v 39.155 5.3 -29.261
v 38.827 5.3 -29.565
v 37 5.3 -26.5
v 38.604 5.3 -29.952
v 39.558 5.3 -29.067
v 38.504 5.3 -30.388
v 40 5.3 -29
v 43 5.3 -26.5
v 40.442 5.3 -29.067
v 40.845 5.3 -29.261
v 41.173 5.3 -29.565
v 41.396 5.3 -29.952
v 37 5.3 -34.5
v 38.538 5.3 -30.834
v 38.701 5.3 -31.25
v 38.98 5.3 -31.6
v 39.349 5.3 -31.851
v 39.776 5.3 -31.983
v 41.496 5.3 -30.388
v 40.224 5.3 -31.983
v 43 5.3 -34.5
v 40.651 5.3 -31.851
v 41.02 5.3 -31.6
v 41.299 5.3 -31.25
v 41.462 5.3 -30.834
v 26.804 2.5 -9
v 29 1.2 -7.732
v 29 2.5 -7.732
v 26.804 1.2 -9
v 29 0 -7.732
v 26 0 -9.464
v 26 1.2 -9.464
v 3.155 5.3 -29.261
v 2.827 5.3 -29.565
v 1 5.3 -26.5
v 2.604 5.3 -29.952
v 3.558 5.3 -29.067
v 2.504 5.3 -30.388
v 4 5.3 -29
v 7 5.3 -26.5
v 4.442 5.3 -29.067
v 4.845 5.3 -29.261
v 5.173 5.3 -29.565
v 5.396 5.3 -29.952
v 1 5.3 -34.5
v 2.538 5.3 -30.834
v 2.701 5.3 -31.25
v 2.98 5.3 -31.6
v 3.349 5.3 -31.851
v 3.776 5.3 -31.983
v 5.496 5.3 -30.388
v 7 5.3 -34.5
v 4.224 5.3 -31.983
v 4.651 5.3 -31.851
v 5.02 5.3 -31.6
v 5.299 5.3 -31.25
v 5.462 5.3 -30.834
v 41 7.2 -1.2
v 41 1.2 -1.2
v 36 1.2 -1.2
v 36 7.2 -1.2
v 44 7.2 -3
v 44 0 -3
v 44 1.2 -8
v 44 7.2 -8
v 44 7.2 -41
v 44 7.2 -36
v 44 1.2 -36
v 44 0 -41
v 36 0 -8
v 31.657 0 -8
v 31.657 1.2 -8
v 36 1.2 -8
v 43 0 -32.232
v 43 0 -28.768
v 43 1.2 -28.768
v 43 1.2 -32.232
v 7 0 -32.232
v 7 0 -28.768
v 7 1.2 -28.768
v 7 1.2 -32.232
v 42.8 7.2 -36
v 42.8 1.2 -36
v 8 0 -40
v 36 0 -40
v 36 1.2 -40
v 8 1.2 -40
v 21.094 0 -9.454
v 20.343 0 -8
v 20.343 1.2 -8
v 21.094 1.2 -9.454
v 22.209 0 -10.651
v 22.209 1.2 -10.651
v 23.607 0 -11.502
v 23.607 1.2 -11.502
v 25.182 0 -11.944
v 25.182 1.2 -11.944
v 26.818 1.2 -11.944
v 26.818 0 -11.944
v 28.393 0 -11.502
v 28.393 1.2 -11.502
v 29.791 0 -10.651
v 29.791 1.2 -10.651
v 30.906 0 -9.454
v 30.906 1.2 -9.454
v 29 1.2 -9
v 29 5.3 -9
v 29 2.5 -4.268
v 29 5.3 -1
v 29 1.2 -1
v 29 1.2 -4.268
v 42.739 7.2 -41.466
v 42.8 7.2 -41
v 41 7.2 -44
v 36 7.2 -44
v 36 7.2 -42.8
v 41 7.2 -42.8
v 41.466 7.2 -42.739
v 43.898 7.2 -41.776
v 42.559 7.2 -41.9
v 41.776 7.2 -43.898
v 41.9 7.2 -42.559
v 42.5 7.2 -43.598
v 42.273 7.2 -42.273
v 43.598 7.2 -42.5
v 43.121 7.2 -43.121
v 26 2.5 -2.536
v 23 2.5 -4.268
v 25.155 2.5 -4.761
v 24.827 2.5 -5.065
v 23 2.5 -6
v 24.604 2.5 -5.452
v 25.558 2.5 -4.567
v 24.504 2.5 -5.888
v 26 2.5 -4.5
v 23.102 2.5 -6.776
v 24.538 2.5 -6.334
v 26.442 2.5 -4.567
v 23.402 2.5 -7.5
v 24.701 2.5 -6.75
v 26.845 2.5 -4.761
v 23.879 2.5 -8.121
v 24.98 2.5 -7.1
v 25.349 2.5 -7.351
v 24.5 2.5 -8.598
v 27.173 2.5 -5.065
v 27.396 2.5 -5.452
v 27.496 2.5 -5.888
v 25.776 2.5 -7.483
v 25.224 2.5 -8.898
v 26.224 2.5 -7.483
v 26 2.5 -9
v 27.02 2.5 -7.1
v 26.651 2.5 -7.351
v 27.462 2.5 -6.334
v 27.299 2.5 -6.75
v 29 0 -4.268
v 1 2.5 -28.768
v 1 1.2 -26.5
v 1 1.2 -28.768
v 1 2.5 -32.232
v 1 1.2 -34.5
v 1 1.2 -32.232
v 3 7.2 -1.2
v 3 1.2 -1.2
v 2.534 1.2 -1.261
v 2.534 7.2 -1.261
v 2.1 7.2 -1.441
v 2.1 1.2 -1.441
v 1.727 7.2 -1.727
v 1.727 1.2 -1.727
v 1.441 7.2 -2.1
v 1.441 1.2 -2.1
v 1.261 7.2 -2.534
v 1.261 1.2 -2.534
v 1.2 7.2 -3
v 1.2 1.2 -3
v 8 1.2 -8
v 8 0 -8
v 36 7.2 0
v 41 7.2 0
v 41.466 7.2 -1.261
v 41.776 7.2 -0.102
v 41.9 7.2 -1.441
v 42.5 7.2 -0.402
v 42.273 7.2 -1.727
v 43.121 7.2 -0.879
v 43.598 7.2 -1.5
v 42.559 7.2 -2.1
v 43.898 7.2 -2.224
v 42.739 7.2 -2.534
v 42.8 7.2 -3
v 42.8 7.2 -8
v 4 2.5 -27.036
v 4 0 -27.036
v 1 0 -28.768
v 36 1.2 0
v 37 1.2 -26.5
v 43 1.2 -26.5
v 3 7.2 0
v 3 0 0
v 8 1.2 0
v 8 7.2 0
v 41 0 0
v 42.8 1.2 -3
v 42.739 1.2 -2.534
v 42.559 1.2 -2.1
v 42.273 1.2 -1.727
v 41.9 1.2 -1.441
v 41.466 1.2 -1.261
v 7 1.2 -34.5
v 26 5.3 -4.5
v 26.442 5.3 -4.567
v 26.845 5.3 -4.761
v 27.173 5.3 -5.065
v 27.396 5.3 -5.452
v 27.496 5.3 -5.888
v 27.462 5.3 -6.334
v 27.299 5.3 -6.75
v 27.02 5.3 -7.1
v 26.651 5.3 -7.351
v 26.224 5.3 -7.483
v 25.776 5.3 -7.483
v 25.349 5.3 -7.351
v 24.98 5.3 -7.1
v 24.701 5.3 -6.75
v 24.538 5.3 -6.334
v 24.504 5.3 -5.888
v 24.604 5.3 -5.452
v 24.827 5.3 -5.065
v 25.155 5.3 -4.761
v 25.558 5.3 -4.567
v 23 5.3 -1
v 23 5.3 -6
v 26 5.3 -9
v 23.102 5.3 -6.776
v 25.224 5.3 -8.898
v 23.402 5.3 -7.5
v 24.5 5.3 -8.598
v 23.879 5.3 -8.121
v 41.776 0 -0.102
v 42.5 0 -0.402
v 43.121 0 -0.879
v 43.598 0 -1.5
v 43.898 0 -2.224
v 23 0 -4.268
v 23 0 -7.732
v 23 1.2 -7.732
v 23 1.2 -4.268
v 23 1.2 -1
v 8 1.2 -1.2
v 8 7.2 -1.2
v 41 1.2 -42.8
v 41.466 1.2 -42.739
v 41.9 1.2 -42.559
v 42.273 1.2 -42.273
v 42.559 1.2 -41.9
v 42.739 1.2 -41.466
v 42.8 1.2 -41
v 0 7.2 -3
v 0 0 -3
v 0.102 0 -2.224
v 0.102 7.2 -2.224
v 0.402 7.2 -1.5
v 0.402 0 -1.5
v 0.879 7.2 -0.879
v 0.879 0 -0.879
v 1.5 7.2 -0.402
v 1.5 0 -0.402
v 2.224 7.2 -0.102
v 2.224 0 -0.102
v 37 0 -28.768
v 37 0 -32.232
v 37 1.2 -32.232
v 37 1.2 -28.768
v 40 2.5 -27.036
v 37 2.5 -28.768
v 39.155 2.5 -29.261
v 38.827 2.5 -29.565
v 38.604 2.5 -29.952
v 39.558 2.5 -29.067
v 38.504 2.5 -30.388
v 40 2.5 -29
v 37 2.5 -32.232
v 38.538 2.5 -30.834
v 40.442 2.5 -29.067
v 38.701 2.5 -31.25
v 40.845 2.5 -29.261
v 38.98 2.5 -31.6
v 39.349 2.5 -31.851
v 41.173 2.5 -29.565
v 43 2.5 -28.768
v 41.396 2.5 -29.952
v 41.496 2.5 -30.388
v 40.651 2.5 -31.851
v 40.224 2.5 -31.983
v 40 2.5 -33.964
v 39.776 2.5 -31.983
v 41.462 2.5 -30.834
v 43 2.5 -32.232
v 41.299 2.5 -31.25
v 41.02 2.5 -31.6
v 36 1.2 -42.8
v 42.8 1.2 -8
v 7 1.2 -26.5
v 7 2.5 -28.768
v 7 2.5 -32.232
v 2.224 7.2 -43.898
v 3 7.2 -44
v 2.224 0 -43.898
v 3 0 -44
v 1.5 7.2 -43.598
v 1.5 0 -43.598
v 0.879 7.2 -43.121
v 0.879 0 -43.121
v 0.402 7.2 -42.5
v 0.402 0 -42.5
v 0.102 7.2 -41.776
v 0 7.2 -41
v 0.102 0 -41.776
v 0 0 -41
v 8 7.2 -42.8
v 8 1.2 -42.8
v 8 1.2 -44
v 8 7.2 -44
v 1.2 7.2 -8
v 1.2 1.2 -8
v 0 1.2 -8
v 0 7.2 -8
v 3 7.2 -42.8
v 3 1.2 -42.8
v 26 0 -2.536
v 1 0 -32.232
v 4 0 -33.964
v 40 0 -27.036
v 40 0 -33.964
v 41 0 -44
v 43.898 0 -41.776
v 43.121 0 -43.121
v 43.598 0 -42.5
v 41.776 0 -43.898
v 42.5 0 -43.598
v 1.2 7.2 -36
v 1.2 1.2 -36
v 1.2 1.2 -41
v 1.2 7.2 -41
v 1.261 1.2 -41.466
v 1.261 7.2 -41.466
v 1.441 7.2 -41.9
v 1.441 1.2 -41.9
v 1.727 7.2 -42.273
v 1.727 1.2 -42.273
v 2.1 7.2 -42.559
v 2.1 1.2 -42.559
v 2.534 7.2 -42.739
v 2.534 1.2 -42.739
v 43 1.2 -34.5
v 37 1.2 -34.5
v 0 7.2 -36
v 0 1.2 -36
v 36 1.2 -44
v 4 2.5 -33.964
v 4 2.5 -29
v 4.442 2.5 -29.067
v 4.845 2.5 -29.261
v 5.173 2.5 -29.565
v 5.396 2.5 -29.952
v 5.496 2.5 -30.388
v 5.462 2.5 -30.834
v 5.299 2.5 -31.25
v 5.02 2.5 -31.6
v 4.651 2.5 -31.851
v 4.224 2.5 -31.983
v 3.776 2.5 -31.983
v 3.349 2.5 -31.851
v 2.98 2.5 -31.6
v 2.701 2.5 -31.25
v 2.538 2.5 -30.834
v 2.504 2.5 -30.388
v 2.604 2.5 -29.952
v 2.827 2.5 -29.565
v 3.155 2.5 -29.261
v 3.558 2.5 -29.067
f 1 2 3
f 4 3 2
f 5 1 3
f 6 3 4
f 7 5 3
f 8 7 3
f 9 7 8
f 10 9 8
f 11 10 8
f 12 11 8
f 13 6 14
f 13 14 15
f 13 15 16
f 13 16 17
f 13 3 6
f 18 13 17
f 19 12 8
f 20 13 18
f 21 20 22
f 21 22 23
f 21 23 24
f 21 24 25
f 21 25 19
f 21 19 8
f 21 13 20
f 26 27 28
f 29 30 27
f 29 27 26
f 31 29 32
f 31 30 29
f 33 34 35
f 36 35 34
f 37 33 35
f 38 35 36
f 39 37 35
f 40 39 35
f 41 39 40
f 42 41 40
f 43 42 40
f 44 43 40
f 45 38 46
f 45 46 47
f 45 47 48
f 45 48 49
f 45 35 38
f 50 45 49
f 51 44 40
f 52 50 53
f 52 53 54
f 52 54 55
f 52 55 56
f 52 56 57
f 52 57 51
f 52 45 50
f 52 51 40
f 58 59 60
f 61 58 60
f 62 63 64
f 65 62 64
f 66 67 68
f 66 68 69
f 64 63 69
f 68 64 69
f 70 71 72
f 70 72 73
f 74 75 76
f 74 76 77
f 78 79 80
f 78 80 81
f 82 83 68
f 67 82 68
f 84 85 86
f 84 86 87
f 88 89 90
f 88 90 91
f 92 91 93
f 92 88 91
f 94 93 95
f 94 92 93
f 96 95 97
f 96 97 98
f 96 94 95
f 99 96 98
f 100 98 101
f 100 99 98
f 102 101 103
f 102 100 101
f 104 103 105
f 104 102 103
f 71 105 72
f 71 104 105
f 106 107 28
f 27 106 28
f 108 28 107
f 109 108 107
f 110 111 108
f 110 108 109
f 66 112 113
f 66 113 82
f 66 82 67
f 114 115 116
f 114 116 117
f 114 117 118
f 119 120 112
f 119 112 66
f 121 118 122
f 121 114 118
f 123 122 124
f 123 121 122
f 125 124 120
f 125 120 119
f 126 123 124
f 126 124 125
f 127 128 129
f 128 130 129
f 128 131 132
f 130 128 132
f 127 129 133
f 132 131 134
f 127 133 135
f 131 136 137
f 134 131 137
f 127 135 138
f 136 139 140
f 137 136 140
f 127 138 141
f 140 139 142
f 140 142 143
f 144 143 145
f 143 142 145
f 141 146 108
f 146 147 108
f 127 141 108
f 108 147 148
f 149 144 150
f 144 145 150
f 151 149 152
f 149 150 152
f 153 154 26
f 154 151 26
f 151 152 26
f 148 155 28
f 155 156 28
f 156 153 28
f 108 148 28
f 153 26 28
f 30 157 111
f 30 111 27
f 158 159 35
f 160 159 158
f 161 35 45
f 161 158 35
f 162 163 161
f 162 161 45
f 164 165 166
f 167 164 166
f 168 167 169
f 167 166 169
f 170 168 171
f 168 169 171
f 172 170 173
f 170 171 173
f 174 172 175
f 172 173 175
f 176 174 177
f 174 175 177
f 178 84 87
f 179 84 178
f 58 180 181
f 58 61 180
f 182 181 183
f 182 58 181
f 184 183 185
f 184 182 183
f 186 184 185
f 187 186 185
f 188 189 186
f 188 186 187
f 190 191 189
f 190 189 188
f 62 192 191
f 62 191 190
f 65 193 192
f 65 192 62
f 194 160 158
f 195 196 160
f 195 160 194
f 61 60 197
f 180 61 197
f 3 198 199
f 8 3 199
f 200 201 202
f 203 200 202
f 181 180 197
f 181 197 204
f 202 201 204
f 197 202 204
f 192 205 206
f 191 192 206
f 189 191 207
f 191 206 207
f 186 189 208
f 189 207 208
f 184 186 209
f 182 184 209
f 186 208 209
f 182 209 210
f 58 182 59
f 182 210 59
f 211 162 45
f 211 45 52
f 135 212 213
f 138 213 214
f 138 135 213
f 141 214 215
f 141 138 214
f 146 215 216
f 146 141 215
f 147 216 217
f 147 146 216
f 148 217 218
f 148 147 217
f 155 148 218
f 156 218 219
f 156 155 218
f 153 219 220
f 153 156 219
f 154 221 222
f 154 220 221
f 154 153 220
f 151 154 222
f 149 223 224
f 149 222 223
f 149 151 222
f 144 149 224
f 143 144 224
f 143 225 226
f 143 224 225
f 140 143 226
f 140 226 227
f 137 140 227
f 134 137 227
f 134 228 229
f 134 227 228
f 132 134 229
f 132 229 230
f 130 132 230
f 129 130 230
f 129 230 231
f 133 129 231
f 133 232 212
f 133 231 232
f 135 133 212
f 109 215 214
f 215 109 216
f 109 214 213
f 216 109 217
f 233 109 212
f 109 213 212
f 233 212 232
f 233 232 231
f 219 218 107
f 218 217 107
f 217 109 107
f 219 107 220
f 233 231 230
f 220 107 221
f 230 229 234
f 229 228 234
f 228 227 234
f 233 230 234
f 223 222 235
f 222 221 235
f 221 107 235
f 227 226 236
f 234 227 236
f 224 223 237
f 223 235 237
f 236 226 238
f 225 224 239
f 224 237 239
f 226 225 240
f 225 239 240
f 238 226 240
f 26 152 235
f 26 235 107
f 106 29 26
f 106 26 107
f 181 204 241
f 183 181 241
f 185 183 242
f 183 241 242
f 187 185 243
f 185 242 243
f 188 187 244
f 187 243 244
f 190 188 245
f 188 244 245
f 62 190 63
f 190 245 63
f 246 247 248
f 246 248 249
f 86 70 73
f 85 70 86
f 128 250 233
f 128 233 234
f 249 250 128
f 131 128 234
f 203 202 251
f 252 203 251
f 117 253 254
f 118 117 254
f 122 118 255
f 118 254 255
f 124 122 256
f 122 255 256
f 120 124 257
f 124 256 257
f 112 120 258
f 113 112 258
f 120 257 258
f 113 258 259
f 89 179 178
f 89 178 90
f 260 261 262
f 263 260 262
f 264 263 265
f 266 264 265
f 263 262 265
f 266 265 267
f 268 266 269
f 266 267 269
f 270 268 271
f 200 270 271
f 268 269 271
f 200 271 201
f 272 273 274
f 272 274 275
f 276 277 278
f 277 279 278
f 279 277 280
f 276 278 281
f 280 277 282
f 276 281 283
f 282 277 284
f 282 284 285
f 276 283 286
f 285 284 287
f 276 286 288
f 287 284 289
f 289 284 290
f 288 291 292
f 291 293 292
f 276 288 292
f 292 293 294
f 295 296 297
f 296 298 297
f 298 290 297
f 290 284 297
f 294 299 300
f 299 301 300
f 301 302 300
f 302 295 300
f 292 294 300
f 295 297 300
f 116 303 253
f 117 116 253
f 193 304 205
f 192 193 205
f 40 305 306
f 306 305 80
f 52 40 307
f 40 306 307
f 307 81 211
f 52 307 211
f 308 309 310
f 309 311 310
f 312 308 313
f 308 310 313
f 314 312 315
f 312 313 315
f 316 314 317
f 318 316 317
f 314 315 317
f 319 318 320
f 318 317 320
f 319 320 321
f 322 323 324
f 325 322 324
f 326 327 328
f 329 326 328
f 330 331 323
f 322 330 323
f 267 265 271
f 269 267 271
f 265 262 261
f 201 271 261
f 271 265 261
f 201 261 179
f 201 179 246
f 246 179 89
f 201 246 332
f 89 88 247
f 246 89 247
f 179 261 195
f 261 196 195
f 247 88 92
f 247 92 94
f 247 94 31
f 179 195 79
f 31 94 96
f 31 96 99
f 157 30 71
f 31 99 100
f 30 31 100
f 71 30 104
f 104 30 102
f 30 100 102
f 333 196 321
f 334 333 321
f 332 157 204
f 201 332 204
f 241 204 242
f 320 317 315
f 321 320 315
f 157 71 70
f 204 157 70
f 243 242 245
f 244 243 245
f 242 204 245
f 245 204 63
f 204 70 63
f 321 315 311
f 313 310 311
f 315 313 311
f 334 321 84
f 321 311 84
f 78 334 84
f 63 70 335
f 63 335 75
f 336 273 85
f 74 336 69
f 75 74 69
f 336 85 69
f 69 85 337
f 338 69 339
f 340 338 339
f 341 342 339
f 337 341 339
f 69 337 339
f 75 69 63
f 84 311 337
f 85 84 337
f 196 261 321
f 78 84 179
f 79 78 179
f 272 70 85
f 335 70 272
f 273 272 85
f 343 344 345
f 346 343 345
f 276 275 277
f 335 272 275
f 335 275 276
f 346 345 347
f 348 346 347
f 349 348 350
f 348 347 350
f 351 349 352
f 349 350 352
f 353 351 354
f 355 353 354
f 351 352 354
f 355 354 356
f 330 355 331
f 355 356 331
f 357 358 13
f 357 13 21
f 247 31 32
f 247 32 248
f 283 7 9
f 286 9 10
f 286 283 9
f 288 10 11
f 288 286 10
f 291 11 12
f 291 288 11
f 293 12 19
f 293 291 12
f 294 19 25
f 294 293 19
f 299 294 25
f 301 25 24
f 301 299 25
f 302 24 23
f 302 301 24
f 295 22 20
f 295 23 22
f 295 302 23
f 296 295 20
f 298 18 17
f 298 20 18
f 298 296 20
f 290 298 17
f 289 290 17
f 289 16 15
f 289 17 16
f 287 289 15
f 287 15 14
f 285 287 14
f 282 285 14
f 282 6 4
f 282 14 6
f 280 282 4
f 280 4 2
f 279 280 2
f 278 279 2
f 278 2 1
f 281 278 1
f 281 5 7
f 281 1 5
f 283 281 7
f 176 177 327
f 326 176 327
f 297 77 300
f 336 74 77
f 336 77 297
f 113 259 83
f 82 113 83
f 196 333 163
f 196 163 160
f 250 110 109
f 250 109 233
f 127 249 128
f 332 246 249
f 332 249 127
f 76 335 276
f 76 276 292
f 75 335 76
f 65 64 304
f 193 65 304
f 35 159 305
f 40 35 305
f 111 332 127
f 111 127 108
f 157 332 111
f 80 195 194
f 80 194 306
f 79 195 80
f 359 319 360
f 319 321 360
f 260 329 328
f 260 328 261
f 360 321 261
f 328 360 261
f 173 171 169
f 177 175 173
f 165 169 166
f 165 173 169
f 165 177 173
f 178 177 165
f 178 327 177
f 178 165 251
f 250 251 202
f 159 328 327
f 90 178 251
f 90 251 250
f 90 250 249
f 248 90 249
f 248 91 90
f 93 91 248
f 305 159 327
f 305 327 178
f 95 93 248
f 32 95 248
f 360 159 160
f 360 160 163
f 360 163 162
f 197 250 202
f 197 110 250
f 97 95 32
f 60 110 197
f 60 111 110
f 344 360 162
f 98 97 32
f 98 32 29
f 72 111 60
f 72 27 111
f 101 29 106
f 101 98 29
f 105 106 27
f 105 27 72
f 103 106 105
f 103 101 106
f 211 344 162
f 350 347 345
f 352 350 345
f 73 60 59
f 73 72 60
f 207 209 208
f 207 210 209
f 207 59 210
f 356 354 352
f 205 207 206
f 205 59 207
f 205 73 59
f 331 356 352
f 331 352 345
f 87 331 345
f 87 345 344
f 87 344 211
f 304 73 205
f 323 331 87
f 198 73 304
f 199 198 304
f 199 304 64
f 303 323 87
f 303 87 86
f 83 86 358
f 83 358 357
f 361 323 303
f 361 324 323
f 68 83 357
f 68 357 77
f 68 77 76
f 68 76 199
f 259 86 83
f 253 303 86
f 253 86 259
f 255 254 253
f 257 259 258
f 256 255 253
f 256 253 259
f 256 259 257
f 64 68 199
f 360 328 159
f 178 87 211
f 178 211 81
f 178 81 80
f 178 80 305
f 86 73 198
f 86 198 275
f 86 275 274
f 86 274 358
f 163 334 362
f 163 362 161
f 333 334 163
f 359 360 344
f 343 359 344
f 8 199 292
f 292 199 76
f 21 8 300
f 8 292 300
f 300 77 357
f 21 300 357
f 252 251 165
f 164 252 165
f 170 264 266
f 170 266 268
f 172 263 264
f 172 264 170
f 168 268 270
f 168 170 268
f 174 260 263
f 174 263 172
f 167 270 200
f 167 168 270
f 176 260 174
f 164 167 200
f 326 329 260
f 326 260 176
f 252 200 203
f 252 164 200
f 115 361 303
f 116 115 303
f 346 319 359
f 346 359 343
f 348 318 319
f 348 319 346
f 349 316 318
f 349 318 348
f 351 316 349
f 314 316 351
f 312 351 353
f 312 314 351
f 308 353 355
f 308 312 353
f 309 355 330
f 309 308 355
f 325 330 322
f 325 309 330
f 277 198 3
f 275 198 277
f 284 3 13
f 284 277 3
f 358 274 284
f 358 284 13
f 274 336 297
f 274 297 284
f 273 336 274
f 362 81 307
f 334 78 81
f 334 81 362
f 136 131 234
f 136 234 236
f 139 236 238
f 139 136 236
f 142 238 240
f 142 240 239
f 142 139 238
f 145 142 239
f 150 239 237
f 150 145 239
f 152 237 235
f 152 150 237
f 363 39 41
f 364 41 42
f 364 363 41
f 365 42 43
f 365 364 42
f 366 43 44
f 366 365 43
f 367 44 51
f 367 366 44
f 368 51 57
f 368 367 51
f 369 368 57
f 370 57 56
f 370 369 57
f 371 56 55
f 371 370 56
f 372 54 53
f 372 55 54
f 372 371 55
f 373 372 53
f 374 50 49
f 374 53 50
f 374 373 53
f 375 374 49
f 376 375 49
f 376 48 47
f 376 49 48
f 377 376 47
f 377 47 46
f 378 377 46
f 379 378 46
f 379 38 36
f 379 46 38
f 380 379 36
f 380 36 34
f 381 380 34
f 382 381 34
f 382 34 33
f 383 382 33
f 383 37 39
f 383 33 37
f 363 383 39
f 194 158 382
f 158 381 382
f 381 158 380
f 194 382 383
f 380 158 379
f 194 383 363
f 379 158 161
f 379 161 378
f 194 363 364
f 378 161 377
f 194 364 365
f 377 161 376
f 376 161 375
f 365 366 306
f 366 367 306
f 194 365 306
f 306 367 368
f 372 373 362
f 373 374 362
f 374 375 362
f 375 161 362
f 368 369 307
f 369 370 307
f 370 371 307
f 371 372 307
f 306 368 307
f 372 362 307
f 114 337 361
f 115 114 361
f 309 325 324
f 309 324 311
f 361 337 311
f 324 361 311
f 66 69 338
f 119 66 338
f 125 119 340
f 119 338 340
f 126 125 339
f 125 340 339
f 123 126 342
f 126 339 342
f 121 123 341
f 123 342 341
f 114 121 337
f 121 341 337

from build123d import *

# Parameters (mm, degrees)
SKETCH1_R           = 1.5
BOSS_EXTRUDE1_DEPTH = 1.2
BOSS_EXTRUDE4_DEPTH = 6
SKETCH5_W           = 6
SKETCH5_H           = 8
BOSS_EXTRUDE8_DEPTH = 4.1
SKETCH1_3_R         = 1.5
CUT_EXTRUDE1_DEPTH  = 2.5
SKETCH1_4_R         = 1.5
CUT_EXTRUDE2_DEPTH  = 63.640561939


with BuildPart() as part:
    # Sketch1 → Boss-Extrude1 (new body)
    with BuildSketch(Plane(origin=(0, 0, 0), x_dir=(1, 0, 0), z_dir=(0, 1, 0))):
        with BuildLine():
            ThreePointArc((0, 3), (0.878679656, 0.878679656), (3, 0))
            Line((3, 0), (41, 0))
            ThreePointArc((41, 0), (43.121320344, 0.878679656), (44, 3))
            Line((44, 3), (44, 41))
            ThreePointArc((44, 41), (43.121320344, 43.121320344), (41, 44))
            Line((41, 44), (3, 44))
            ThreePointArc((3, 44), (0.878679656, 43.121320344), (0, 41))
            Line((0, 41), (0, 3))
        make_face()
        with BuildLine():
            Line((36, 8), (31.656854249, 8))
            ThreePointArc((31.656854249, 8), (26, 12), (20.343145751, 8))
            Line((20.343145751, 8), (8, 8))
            Line((8, 8), (8, 40))
            Line((8, 40), (36, 40))
            Line((36, 40), (36, 8))
        make_face(mode=Mode.SUBTRACT)
        with Locations((26, 6)):
            Circle(SKETCH1_R, mode=Mode.SUBTRACT)
        with Locations((4, 30.5)):
            Circle(SKETCH1_R, mode=Mode.SUBTRACT)
        with Locations((40, 30.5)):
            Circle(SKETCH1_R, mode=Mode.SUBTRACT)
    extrude(amount=BOSS_EXTRUDE1_DEPTH)

    # Sketch4 → Boss-Extrude4 (add)
    with BuildSketch(Plane(origin=(0, 1.2, 0), x_dir=(1, 0, 0), z_dir=(0, 1, 0))):
        with BuildLine():
            Line((3, 44), (8, 44))
            Line((8, 44), (8, 42.8))
            Line((8, 42.8), (3, 42.8))
            ThreePointArc((3, 42.8), (1.727207794, 42.272792206), (1.2, 41))
            Line((1.2, 41), (1.2, 36))
            Line((1.2, 36), (0, 36))
            Line((0, 36), (0, 41))
            ThreePointArc((0, 41), (0.878679656, 43.121320344), (3, 44))
        make_face()
        with BuildLine():
            Line((41, 44), (36, 44))
            Line((36, 44), (36, 42.8))
            Line((36, 42.8), (41, 42.8))
            ThreePointArc((41, 42.8), (42.272792206, 42.272792206), (42.8, 41))
            Line((42.8, 41), (42.8, 36))
            Line((42.8, 36), (44, 36))
            Line((44, 36), (44, 41))
            ThreePointArc((44, 41), (43.121320344, 43.121320344), (41, 44))
        make_face()
        with BuildLine():
            Line((41, 0), (36, 0))
            Line((36, 0), (36, 1.2))
            Line((36, 1.2), (41, 1.2))
            ThreePointArc((41, 1.2), (42.272792206, 1.727207794), (42.8, 3))
            Line((42.8, 3), (42.8, 8))
            Line((42.8, 8), (44, 8))
            Line((44, 8), (44, 3))
            ThreePointArc((44, 3), (43.121320344, 0.878679656), (41, 0))
        make_face()
        with BuildLine():
            Line((3, 0), (8, 0))
            Line((8, 0), (8, 1.2))
            Line((8, 1.2), (3, 1.2))
            ThreePointArc((3, 1.2), (1.727207794, 1.727207794), (1.2, 3))
            Line((1.2, 3), (1.2, 8))
            Line((1.2, 8), (0, 8))
            Line((0, 8), (0, 3))
            ThreePointArc((0, 3), (0.878679656, 0.878679656), (3, 0))
        make_face()
    extrude(amount=BOSS_EXTRUDE4_DEPTH)

    # Sketch5 → Boss-Extrude8 (add)
    with BuildSketch(Plane(origin=(0, 1.2, 0), x_dir=(1, 0, 0), z_dir=(0, 1, 0))):
        with Locations((4, 30.5)):
            Rectangle(SKETCH5_W, SKETCH5_H)
        with Locations((40, 30.5)):
            Rectangle(SKETCH5_W, SKETCH5_H)
        with BuildLine():
            Line((26, 9), (29, 9))
            Line((29, 9), (29, 1))
            Line((29, 1), (23, 1))
            Line((23, 1), (23, 6))
            ThreePointArc((23, 6), (23.878679656, 8.121320344), (26, 9))
        make_face()
    extrude(amount=BOSS_EXTRUDE8_DEPTH)

    # Sketch1<3> → Cut-Extrude1 (cut)
    # profile 1 of 3: a face of its own
    with BuildSketch(Plane(origin=(0, 0, 0), x_dir=(1, 0, 0), z_dir=(0, 1, 0))):
        Polygon((4, 33.964101615), (1, 32.232050808), (1, 28.767949192), (4, 27.035898385), (7, 28.767949192), (7, 32.232050808), align=None)
        with Locations((4, 30.5)):
            Circle(SKETCH1_3_R, mode=Mode.SUBTRACT)
    # profile 2 of 3: a face of its own
    with BuildSketch(Plane(origin=(0, 0, 0), x_dir=(1, 0, 0), z_dir=(0, 1, 0))):
        Polygon((40, 33.964101615), (37, 32.232050808), (37, 28.767949192), (40, 27.035898385), (43, 28.767949192), (43, 32.232050808), align=None)
        with Locations((40, 30.5)):
            Circle(SKETCH1_3_R, mode=Mode.SUBTRACT)
    # profile 3 of 3: a face of its own
    with BuildSketch(Plane(origin=(0, 0, 0), x_dir=(1, 0, 0), z_dir=(0, 1, 0))):
        Polygon((26, 9.464101615), (23, 7.732050808), (23, 4.267949192), (26, 2.535898385), (29, 4.267949192), (29, 7.732050808), align=None)
        with Locations((26, 6)):
            Circle(SKETCH1_3_R, mode=Mode.SUBTRACT)
    extrude(amount=CUT_EXTRUDE1_DEPTH, mode=Mode.SUBTRACT)

    # Sketch1<4> → Cut-Extrude2 (cut, through all)
    with BuildSketch(Plane(origin=(0, 0, 0), x_dir=(1, 0, 0), z_dir=(0, 1, 0))):
        with Locations((4, 30.5)):
            Circle(SKETCH1_4_R)
        with Locations((40, 30.5)):
            Circle(SKETCH1_4_R)
        with Locations((26, 6)):
            Circle(SKETCH1_4_R)
    extrude(amount=CUT_EXTRUDE2_DEPTH, mode=Mode.SUBTRACT)


solid = part.part
